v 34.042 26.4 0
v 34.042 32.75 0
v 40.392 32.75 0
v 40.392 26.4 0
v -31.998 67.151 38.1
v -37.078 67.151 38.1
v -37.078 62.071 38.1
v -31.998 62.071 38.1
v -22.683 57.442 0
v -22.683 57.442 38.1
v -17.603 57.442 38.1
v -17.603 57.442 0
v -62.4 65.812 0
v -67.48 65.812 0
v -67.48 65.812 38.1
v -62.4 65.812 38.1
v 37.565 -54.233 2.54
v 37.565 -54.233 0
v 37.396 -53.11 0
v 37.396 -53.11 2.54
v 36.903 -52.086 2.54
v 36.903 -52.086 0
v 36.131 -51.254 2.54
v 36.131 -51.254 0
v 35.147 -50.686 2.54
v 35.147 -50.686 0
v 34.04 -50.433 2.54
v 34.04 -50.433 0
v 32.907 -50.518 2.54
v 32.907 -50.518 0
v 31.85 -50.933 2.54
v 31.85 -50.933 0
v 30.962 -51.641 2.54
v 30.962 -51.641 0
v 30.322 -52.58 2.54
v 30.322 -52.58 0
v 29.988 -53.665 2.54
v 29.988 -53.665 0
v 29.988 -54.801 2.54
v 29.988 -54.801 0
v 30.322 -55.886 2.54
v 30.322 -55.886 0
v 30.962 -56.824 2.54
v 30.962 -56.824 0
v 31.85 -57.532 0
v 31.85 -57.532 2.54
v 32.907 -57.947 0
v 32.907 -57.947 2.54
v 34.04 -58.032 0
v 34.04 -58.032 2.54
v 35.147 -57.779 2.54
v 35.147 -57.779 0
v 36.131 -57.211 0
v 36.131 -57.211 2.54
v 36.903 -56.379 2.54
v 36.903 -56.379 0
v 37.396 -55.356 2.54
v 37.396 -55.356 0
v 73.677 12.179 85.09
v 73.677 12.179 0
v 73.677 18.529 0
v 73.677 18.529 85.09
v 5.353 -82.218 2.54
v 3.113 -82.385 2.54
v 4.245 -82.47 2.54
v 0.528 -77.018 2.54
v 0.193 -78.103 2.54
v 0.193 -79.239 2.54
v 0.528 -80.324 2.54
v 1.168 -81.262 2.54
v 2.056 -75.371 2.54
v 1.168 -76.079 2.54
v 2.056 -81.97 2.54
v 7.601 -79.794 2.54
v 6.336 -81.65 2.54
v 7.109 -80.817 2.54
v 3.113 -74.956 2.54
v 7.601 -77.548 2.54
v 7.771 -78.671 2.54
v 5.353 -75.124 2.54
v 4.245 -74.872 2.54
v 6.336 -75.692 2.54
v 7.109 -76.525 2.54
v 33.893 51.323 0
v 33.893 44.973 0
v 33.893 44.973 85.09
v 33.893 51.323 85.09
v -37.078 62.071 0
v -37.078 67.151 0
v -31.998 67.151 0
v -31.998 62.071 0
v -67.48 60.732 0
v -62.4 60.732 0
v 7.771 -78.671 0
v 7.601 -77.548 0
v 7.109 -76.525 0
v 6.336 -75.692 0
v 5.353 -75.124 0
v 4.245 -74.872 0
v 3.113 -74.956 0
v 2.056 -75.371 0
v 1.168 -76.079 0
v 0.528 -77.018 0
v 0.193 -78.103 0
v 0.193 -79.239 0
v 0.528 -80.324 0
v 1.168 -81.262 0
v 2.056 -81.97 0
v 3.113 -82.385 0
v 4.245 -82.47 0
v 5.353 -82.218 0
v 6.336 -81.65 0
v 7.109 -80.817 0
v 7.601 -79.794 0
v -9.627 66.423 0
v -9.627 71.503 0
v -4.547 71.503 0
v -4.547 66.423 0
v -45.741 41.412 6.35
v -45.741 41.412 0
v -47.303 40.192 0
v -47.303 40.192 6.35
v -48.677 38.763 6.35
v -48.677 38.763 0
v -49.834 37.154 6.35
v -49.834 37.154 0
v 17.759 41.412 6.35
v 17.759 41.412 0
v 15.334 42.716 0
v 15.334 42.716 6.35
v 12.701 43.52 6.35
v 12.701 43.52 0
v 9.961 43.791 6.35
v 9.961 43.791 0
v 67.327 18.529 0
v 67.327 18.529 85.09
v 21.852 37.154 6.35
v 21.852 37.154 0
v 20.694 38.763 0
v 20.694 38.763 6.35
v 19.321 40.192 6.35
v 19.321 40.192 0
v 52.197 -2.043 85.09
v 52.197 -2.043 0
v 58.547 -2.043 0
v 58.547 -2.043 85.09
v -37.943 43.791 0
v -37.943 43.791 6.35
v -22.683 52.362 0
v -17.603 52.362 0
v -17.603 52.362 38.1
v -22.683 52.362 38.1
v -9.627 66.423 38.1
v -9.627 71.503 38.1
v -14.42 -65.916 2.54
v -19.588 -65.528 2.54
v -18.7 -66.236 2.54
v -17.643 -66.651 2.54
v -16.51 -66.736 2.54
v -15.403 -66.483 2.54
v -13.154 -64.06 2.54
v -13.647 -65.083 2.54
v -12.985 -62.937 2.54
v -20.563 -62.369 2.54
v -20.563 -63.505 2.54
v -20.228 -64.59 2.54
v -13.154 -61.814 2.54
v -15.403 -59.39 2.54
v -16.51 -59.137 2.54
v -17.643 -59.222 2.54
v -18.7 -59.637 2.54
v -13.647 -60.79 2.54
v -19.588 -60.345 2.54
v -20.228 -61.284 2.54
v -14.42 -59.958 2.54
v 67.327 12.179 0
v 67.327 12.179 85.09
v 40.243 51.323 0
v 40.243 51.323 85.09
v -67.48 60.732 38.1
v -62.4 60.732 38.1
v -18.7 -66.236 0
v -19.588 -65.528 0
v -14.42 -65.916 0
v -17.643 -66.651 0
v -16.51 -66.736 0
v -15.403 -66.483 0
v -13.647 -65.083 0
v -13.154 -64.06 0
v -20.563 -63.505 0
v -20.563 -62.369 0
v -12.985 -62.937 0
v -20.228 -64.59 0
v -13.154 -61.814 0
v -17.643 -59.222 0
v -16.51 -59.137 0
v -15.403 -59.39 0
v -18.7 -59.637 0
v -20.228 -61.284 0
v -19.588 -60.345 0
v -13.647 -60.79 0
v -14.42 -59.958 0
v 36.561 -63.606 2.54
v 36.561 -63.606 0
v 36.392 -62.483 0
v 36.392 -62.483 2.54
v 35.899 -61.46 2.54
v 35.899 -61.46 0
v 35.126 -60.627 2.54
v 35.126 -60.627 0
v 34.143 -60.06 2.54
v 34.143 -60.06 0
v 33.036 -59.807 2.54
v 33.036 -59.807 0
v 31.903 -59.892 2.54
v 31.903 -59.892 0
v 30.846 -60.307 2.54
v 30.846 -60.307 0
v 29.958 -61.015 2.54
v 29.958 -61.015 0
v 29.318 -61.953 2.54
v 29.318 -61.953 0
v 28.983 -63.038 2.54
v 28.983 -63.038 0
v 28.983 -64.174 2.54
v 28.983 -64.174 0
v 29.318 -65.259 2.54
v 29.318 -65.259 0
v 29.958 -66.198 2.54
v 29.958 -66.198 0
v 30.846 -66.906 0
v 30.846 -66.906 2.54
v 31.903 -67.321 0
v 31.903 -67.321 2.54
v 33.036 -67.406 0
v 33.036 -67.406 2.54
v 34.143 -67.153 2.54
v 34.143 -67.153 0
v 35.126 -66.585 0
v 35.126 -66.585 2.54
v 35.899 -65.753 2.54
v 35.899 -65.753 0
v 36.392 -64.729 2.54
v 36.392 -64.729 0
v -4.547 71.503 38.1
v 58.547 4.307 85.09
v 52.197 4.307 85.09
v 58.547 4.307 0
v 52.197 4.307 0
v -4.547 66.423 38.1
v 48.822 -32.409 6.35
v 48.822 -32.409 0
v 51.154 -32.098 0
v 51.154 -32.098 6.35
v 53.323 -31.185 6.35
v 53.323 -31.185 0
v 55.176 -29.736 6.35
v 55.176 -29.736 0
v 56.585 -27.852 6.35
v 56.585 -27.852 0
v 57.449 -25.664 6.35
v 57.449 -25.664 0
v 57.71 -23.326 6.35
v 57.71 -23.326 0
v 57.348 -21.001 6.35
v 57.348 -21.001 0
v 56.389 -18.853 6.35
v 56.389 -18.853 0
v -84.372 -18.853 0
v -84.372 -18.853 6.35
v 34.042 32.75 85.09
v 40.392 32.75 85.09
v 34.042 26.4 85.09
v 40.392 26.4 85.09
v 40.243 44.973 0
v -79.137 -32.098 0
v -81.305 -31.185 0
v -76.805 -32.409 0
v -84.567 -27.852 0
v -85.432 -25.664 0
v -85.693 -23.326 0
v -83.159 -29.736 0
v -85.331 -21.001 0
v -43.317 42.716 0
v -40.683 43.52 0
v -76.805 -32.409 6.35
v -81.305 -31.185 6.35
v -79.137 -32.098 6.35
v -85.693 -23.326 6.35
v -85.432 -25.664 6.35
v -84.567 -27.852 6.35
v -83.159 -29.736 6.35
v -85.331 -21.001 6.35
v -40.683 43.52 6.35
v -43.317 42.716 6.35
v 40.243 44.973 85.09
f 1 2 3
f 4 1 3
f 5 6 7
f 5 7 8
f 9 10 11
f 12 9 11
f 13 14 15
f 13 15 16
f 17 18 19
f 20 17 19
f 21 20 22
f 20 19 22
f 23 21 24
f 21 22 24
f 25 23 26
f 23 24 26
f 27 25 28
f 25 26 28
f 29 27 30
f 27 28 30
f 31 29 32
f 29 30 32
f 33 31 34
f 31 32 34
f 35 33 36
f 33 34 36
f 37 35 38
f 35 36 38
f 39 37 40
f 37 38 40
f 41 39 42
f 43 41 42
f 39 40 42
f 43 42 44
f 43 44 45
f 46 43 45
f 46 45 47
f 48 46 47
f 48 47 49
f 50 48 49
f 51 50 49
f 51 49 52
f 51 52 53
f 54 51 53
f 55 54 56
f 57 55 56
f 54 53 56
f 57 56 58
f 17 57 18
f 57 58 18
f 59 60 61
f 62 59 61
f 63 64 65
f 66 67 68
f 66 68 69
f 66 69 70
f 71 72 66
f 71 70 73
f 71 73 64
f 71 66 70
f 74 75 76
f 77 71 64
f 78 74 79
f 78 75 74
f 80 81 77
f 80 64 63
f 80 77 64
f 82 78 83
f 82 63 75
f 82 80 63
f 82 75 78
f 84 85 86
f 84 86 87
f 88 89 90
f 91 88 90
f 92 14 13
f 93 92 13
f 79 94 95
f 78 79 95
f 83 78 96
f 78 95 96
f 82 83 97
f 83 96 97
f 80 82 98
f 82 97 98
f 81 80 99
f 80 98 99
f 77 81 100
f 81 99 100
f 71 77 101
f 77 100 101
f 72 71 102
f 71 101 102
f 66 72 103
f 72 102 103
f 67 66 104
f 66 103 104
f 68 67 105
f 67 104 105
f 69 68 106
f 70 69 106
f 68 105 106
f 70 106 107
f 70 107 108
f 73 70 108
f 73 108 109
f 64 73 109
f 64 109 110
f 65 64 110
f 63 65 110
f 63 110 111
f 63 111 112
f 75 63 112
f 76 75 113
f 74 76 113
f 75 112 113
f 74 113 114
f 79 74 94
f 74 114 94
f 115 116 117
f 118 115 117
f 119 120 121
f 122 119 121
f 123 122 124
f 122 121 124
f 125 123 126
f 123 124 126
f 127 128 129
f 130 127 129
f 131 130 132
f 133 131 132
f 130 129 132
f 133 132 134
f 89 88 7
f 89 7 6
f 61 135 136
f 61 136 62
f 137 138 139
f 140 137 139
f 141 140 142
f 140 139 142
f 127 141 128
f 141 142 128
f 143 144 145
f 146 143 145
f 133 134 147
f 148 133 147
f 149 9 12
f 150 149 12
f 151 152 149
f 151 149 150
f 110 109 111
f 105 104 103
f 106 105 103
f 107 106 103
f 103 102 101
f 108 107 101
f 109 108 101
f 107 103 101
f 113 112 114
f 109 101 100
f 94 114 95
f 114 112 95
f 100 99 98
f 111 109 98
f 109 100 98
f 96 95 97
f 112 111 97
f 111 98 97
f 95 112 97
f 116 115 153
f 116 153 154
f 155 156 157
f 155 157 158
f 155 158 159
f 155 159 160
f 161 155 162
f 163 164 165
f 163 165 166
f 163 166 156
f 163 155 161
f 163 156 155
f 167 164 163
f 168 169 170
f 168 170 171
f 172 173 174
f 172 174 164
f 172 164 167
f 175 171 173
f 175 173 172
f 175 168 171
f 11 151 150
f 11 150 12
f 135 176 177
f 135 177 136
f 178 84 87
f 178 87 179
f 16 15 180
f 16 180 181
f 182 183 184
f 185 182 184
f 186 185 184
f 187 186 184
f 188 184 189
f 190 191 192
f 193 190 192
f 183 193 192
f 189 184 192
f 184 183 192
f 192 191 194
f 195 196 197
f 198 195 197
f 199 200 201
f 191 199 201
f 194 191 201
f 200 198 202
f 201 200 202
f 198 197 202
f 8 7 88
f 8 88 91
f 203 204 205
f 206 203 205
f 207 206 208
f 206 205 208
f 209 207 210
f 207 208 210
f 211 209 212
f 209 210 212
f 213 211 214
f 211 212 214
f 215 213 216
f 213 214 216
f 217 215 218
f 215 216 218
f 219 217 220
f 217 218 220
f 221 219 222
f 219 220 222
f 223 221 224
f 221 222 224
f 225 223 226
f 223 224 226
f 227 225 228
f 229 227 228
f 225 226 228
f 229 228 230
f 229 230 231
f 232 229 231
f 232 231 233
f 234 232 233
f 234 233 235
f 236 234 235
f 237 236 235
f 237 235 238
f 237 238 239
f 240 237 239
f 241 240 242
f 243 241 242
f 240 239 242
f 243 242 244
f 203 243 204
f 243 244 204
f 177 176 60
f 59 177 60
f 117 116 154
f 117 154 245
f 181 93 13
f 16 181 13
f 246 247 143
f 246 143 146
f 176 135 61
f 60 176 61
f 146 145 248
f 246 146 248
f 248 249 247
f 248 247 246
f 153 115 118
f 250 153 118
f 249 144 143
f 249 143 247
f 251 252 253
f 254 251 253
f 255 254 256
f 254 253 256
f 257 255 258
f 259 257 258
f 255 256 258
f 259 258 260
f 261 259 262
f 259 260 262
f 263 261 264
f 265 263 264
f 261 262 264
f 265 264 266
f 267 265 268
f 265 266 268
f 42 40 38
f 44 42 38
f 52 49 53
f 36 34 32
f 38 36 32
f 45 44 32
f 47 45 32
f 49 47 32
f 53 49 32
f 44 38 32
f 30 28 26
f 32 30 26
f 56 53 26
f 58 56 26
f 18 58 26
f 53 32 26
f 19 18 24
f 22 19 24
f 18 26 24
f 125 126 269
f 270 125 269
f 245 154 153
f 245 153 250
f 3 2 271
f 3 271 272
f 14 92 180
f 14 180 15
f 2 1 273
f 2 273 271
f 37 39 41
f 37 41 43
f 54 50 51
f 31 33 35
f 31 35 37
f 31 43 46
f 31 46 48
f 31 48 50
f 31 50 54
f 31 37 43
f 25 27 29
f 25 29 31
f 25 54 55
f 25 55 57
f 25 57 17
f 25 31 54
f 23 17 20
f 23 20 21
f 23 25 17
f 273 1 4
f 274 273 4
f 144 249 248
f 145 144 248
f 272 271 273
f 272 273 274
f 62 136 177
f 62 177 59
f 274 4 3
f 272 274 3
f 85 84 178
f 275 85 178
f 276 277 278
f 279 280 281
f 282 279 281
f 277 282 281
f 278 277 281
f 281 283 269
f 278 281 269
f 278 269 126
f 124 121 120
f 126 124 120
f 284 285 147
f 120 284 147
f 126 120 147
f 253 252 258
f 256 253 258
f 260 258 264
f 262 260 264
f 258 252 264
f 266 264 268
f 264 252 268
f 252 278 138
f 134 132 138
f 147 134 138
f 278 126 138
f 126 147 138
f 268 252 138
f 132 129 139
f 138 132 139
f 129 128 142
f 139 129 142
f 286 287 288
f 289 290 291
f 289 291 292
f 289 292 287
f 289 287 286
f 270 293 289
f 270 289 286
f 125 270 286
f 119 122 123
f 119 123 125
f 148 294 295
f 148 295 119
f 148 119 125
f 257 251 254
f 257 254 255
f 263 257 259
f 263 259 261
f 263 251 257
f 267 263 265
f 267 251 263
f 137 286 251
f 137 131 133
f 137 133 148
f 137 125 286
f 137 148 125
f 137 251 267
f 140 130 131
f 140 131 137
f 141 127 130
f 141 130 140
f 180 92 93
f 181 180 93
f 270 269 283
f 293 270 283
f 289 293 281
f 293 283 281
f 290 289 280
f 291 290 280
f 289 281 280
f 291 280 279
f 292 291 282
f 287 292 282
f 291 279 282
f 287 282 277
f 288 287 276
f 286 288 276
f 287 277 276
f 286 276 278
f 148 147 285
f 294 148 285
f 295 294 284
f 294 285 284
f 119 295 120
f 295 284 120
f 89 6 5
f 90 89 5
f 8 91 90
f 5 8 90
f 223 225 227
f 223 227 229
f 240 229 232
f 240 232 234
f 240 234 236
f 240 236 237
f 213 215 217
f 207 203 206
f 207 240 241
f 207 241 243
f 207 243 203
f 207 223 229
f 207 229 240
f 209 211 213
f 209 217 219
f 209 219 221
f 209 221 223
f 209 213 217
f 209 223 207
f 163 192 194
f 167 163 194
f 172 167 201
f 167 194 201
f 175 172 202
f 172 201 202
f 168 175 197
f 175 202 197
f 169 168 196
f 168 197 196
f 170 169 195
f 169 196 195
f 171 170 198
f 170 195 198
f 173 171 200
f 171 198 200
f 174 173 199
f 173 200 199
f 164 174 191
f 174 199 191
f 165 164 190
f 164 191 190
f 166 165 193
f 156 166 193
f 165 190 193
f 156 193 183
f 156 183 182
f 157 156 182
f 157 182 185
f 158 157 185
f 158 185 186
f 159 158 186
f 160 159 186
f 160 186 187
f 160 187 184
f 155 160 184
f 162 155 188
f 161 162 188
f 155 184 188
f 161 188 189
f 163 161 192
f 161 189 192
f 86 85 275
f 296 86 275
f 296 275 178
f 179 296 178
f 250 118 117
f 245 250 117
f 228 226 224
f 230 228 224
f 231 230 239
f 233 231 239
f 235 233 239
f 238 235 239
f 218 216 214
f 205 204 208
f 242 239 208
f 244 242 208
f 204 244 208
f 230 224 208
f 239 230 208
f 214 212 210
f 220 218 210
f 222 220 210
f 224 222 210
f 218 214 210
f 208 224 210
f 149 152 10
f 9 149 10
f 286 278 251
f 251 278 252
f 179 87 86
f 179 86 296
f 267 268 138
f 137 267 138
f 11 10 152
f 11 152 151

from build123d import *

# Parameters (mm, degrees)
F1_DEPTH = 6.35
F2_W     = 6.35
F2_H     = 6.35
F3_DEPTH = 85.09
F4_W     = 5.08
F4_H     = 5.08
F5_DEPTH = 38.1
F6_R     = 3.81
F7_DEPTH = 2.54


with BuildPart() as f1:
    # F0 (on Top) → F1 (new body)
    with BuildSketch(Plane.XY):
        with BuildLine():
            Line((-45.741252, -32.408912), (-45.741252, 41.412222))
            ThreePointArc((-45.741252, 41.412222), (-48.015386, 39.50179), (-49.834257, 37.153783))
            Line((-49.834257, 37.153783), (-84.371558, -18.852652))
            ThreePointArc((-84.371558, -18.852652), (-84.567225, -27.85187), (-76.804649, -32.408912))
            Line((-76.804649, -32.408912), (-45.741252, -32.408912))
        make_face()
        with BuildLine():
            ThreePointArc((21.851752, 37.153783), (20.032881, 39.50179), (17.758748, 41.412222))
            Line((17.758748, 41.412222), (17.758748, -32.408912))
            Line((17.758748, -32.408912), (48.822145, -32.408912))
            ThreePointArc((48.822145, -32.408912), (56.58472, -27.85187), (56.389054, -18.852652))
            Line((56.389054, -18.852652), (21.851752, 37.153783))
        make_face()
        with BuildLine():
            Line((9.960895, 43.791088), (-37.9434, 43.791088))
            ThreePointArc((-37.9434, 43.791088), (-42.019719, 43.183143), (-45.741252, 41.412222))
            Line((-45.741252, 41.412222), (-45.741252, -32.408912))
            Line((-45.741252, -32.408912), (17.758748, -32.408912))
            Line((17.758748, -32.408912), (17.758748, 41.412222))
            ThreePointArc((17.758748, 41.412222), (14.037214, 43.183143), (9.960895, 43.791088))
        make_face()
    extrude(amount=F1_DEPTH)


with BuildPart() as f3:
    # F2 (on Top) → F3 (new body)
    with BuildSketch(Plane.XY):
        with Locations((55.372456, 1.132299)):
            Rectangle(F2_W, F2_H)
        with Locations((70.501657, 15.353753)):
            Rectangle(F2_W, F2_H)
        with Locations((37.217411, 29.575207)):
            Rectangle(F2_W, F2_H)
        with Locations((37.068252, 48.148061)):
            Rectangle(F2_W, F2_H)
    extrude(amount=F3_DEPTH)


with BuildPart() as f5:
    # F4 (on Top) → F5 (new body)
    with BuildSketch(Plane.XY):
        with Locations((-7.0868, 68.962596)):
            Rectangle(F4_W, F4_H)
        with Locations((-20.142827, 54.902259)):
            Rectangle(F4_W, F4_H)
        with Locations((-34.53793, 64.610586)):
            Rectangle(F4_W, F4_H)
        with Locations((-64.939551, 63.271508)):
            Rectangle(F4_W, F4_H)
    extrude(amount=F5_DEPTH)


with BuildPart() as f7:
    # F6 (on Top) → F7 (new body)
    with BuildSketch(Plane.XY):
        with Locations((33.75512, -54.23272)):
            Circle(F6_R)
        with Locations((3.960603, -78.670919)):
            Circle(F6_R)
        with Locations((-16.795127, -62.936738)):
            Circle(F6_R)
        with Locations((32.750815, -63.606277)):
            Circle(F6_R)
    extrude(amount=F7_DEPTH)


solid = Compound([f1.part, f3.part, f5.part, f7.part])
